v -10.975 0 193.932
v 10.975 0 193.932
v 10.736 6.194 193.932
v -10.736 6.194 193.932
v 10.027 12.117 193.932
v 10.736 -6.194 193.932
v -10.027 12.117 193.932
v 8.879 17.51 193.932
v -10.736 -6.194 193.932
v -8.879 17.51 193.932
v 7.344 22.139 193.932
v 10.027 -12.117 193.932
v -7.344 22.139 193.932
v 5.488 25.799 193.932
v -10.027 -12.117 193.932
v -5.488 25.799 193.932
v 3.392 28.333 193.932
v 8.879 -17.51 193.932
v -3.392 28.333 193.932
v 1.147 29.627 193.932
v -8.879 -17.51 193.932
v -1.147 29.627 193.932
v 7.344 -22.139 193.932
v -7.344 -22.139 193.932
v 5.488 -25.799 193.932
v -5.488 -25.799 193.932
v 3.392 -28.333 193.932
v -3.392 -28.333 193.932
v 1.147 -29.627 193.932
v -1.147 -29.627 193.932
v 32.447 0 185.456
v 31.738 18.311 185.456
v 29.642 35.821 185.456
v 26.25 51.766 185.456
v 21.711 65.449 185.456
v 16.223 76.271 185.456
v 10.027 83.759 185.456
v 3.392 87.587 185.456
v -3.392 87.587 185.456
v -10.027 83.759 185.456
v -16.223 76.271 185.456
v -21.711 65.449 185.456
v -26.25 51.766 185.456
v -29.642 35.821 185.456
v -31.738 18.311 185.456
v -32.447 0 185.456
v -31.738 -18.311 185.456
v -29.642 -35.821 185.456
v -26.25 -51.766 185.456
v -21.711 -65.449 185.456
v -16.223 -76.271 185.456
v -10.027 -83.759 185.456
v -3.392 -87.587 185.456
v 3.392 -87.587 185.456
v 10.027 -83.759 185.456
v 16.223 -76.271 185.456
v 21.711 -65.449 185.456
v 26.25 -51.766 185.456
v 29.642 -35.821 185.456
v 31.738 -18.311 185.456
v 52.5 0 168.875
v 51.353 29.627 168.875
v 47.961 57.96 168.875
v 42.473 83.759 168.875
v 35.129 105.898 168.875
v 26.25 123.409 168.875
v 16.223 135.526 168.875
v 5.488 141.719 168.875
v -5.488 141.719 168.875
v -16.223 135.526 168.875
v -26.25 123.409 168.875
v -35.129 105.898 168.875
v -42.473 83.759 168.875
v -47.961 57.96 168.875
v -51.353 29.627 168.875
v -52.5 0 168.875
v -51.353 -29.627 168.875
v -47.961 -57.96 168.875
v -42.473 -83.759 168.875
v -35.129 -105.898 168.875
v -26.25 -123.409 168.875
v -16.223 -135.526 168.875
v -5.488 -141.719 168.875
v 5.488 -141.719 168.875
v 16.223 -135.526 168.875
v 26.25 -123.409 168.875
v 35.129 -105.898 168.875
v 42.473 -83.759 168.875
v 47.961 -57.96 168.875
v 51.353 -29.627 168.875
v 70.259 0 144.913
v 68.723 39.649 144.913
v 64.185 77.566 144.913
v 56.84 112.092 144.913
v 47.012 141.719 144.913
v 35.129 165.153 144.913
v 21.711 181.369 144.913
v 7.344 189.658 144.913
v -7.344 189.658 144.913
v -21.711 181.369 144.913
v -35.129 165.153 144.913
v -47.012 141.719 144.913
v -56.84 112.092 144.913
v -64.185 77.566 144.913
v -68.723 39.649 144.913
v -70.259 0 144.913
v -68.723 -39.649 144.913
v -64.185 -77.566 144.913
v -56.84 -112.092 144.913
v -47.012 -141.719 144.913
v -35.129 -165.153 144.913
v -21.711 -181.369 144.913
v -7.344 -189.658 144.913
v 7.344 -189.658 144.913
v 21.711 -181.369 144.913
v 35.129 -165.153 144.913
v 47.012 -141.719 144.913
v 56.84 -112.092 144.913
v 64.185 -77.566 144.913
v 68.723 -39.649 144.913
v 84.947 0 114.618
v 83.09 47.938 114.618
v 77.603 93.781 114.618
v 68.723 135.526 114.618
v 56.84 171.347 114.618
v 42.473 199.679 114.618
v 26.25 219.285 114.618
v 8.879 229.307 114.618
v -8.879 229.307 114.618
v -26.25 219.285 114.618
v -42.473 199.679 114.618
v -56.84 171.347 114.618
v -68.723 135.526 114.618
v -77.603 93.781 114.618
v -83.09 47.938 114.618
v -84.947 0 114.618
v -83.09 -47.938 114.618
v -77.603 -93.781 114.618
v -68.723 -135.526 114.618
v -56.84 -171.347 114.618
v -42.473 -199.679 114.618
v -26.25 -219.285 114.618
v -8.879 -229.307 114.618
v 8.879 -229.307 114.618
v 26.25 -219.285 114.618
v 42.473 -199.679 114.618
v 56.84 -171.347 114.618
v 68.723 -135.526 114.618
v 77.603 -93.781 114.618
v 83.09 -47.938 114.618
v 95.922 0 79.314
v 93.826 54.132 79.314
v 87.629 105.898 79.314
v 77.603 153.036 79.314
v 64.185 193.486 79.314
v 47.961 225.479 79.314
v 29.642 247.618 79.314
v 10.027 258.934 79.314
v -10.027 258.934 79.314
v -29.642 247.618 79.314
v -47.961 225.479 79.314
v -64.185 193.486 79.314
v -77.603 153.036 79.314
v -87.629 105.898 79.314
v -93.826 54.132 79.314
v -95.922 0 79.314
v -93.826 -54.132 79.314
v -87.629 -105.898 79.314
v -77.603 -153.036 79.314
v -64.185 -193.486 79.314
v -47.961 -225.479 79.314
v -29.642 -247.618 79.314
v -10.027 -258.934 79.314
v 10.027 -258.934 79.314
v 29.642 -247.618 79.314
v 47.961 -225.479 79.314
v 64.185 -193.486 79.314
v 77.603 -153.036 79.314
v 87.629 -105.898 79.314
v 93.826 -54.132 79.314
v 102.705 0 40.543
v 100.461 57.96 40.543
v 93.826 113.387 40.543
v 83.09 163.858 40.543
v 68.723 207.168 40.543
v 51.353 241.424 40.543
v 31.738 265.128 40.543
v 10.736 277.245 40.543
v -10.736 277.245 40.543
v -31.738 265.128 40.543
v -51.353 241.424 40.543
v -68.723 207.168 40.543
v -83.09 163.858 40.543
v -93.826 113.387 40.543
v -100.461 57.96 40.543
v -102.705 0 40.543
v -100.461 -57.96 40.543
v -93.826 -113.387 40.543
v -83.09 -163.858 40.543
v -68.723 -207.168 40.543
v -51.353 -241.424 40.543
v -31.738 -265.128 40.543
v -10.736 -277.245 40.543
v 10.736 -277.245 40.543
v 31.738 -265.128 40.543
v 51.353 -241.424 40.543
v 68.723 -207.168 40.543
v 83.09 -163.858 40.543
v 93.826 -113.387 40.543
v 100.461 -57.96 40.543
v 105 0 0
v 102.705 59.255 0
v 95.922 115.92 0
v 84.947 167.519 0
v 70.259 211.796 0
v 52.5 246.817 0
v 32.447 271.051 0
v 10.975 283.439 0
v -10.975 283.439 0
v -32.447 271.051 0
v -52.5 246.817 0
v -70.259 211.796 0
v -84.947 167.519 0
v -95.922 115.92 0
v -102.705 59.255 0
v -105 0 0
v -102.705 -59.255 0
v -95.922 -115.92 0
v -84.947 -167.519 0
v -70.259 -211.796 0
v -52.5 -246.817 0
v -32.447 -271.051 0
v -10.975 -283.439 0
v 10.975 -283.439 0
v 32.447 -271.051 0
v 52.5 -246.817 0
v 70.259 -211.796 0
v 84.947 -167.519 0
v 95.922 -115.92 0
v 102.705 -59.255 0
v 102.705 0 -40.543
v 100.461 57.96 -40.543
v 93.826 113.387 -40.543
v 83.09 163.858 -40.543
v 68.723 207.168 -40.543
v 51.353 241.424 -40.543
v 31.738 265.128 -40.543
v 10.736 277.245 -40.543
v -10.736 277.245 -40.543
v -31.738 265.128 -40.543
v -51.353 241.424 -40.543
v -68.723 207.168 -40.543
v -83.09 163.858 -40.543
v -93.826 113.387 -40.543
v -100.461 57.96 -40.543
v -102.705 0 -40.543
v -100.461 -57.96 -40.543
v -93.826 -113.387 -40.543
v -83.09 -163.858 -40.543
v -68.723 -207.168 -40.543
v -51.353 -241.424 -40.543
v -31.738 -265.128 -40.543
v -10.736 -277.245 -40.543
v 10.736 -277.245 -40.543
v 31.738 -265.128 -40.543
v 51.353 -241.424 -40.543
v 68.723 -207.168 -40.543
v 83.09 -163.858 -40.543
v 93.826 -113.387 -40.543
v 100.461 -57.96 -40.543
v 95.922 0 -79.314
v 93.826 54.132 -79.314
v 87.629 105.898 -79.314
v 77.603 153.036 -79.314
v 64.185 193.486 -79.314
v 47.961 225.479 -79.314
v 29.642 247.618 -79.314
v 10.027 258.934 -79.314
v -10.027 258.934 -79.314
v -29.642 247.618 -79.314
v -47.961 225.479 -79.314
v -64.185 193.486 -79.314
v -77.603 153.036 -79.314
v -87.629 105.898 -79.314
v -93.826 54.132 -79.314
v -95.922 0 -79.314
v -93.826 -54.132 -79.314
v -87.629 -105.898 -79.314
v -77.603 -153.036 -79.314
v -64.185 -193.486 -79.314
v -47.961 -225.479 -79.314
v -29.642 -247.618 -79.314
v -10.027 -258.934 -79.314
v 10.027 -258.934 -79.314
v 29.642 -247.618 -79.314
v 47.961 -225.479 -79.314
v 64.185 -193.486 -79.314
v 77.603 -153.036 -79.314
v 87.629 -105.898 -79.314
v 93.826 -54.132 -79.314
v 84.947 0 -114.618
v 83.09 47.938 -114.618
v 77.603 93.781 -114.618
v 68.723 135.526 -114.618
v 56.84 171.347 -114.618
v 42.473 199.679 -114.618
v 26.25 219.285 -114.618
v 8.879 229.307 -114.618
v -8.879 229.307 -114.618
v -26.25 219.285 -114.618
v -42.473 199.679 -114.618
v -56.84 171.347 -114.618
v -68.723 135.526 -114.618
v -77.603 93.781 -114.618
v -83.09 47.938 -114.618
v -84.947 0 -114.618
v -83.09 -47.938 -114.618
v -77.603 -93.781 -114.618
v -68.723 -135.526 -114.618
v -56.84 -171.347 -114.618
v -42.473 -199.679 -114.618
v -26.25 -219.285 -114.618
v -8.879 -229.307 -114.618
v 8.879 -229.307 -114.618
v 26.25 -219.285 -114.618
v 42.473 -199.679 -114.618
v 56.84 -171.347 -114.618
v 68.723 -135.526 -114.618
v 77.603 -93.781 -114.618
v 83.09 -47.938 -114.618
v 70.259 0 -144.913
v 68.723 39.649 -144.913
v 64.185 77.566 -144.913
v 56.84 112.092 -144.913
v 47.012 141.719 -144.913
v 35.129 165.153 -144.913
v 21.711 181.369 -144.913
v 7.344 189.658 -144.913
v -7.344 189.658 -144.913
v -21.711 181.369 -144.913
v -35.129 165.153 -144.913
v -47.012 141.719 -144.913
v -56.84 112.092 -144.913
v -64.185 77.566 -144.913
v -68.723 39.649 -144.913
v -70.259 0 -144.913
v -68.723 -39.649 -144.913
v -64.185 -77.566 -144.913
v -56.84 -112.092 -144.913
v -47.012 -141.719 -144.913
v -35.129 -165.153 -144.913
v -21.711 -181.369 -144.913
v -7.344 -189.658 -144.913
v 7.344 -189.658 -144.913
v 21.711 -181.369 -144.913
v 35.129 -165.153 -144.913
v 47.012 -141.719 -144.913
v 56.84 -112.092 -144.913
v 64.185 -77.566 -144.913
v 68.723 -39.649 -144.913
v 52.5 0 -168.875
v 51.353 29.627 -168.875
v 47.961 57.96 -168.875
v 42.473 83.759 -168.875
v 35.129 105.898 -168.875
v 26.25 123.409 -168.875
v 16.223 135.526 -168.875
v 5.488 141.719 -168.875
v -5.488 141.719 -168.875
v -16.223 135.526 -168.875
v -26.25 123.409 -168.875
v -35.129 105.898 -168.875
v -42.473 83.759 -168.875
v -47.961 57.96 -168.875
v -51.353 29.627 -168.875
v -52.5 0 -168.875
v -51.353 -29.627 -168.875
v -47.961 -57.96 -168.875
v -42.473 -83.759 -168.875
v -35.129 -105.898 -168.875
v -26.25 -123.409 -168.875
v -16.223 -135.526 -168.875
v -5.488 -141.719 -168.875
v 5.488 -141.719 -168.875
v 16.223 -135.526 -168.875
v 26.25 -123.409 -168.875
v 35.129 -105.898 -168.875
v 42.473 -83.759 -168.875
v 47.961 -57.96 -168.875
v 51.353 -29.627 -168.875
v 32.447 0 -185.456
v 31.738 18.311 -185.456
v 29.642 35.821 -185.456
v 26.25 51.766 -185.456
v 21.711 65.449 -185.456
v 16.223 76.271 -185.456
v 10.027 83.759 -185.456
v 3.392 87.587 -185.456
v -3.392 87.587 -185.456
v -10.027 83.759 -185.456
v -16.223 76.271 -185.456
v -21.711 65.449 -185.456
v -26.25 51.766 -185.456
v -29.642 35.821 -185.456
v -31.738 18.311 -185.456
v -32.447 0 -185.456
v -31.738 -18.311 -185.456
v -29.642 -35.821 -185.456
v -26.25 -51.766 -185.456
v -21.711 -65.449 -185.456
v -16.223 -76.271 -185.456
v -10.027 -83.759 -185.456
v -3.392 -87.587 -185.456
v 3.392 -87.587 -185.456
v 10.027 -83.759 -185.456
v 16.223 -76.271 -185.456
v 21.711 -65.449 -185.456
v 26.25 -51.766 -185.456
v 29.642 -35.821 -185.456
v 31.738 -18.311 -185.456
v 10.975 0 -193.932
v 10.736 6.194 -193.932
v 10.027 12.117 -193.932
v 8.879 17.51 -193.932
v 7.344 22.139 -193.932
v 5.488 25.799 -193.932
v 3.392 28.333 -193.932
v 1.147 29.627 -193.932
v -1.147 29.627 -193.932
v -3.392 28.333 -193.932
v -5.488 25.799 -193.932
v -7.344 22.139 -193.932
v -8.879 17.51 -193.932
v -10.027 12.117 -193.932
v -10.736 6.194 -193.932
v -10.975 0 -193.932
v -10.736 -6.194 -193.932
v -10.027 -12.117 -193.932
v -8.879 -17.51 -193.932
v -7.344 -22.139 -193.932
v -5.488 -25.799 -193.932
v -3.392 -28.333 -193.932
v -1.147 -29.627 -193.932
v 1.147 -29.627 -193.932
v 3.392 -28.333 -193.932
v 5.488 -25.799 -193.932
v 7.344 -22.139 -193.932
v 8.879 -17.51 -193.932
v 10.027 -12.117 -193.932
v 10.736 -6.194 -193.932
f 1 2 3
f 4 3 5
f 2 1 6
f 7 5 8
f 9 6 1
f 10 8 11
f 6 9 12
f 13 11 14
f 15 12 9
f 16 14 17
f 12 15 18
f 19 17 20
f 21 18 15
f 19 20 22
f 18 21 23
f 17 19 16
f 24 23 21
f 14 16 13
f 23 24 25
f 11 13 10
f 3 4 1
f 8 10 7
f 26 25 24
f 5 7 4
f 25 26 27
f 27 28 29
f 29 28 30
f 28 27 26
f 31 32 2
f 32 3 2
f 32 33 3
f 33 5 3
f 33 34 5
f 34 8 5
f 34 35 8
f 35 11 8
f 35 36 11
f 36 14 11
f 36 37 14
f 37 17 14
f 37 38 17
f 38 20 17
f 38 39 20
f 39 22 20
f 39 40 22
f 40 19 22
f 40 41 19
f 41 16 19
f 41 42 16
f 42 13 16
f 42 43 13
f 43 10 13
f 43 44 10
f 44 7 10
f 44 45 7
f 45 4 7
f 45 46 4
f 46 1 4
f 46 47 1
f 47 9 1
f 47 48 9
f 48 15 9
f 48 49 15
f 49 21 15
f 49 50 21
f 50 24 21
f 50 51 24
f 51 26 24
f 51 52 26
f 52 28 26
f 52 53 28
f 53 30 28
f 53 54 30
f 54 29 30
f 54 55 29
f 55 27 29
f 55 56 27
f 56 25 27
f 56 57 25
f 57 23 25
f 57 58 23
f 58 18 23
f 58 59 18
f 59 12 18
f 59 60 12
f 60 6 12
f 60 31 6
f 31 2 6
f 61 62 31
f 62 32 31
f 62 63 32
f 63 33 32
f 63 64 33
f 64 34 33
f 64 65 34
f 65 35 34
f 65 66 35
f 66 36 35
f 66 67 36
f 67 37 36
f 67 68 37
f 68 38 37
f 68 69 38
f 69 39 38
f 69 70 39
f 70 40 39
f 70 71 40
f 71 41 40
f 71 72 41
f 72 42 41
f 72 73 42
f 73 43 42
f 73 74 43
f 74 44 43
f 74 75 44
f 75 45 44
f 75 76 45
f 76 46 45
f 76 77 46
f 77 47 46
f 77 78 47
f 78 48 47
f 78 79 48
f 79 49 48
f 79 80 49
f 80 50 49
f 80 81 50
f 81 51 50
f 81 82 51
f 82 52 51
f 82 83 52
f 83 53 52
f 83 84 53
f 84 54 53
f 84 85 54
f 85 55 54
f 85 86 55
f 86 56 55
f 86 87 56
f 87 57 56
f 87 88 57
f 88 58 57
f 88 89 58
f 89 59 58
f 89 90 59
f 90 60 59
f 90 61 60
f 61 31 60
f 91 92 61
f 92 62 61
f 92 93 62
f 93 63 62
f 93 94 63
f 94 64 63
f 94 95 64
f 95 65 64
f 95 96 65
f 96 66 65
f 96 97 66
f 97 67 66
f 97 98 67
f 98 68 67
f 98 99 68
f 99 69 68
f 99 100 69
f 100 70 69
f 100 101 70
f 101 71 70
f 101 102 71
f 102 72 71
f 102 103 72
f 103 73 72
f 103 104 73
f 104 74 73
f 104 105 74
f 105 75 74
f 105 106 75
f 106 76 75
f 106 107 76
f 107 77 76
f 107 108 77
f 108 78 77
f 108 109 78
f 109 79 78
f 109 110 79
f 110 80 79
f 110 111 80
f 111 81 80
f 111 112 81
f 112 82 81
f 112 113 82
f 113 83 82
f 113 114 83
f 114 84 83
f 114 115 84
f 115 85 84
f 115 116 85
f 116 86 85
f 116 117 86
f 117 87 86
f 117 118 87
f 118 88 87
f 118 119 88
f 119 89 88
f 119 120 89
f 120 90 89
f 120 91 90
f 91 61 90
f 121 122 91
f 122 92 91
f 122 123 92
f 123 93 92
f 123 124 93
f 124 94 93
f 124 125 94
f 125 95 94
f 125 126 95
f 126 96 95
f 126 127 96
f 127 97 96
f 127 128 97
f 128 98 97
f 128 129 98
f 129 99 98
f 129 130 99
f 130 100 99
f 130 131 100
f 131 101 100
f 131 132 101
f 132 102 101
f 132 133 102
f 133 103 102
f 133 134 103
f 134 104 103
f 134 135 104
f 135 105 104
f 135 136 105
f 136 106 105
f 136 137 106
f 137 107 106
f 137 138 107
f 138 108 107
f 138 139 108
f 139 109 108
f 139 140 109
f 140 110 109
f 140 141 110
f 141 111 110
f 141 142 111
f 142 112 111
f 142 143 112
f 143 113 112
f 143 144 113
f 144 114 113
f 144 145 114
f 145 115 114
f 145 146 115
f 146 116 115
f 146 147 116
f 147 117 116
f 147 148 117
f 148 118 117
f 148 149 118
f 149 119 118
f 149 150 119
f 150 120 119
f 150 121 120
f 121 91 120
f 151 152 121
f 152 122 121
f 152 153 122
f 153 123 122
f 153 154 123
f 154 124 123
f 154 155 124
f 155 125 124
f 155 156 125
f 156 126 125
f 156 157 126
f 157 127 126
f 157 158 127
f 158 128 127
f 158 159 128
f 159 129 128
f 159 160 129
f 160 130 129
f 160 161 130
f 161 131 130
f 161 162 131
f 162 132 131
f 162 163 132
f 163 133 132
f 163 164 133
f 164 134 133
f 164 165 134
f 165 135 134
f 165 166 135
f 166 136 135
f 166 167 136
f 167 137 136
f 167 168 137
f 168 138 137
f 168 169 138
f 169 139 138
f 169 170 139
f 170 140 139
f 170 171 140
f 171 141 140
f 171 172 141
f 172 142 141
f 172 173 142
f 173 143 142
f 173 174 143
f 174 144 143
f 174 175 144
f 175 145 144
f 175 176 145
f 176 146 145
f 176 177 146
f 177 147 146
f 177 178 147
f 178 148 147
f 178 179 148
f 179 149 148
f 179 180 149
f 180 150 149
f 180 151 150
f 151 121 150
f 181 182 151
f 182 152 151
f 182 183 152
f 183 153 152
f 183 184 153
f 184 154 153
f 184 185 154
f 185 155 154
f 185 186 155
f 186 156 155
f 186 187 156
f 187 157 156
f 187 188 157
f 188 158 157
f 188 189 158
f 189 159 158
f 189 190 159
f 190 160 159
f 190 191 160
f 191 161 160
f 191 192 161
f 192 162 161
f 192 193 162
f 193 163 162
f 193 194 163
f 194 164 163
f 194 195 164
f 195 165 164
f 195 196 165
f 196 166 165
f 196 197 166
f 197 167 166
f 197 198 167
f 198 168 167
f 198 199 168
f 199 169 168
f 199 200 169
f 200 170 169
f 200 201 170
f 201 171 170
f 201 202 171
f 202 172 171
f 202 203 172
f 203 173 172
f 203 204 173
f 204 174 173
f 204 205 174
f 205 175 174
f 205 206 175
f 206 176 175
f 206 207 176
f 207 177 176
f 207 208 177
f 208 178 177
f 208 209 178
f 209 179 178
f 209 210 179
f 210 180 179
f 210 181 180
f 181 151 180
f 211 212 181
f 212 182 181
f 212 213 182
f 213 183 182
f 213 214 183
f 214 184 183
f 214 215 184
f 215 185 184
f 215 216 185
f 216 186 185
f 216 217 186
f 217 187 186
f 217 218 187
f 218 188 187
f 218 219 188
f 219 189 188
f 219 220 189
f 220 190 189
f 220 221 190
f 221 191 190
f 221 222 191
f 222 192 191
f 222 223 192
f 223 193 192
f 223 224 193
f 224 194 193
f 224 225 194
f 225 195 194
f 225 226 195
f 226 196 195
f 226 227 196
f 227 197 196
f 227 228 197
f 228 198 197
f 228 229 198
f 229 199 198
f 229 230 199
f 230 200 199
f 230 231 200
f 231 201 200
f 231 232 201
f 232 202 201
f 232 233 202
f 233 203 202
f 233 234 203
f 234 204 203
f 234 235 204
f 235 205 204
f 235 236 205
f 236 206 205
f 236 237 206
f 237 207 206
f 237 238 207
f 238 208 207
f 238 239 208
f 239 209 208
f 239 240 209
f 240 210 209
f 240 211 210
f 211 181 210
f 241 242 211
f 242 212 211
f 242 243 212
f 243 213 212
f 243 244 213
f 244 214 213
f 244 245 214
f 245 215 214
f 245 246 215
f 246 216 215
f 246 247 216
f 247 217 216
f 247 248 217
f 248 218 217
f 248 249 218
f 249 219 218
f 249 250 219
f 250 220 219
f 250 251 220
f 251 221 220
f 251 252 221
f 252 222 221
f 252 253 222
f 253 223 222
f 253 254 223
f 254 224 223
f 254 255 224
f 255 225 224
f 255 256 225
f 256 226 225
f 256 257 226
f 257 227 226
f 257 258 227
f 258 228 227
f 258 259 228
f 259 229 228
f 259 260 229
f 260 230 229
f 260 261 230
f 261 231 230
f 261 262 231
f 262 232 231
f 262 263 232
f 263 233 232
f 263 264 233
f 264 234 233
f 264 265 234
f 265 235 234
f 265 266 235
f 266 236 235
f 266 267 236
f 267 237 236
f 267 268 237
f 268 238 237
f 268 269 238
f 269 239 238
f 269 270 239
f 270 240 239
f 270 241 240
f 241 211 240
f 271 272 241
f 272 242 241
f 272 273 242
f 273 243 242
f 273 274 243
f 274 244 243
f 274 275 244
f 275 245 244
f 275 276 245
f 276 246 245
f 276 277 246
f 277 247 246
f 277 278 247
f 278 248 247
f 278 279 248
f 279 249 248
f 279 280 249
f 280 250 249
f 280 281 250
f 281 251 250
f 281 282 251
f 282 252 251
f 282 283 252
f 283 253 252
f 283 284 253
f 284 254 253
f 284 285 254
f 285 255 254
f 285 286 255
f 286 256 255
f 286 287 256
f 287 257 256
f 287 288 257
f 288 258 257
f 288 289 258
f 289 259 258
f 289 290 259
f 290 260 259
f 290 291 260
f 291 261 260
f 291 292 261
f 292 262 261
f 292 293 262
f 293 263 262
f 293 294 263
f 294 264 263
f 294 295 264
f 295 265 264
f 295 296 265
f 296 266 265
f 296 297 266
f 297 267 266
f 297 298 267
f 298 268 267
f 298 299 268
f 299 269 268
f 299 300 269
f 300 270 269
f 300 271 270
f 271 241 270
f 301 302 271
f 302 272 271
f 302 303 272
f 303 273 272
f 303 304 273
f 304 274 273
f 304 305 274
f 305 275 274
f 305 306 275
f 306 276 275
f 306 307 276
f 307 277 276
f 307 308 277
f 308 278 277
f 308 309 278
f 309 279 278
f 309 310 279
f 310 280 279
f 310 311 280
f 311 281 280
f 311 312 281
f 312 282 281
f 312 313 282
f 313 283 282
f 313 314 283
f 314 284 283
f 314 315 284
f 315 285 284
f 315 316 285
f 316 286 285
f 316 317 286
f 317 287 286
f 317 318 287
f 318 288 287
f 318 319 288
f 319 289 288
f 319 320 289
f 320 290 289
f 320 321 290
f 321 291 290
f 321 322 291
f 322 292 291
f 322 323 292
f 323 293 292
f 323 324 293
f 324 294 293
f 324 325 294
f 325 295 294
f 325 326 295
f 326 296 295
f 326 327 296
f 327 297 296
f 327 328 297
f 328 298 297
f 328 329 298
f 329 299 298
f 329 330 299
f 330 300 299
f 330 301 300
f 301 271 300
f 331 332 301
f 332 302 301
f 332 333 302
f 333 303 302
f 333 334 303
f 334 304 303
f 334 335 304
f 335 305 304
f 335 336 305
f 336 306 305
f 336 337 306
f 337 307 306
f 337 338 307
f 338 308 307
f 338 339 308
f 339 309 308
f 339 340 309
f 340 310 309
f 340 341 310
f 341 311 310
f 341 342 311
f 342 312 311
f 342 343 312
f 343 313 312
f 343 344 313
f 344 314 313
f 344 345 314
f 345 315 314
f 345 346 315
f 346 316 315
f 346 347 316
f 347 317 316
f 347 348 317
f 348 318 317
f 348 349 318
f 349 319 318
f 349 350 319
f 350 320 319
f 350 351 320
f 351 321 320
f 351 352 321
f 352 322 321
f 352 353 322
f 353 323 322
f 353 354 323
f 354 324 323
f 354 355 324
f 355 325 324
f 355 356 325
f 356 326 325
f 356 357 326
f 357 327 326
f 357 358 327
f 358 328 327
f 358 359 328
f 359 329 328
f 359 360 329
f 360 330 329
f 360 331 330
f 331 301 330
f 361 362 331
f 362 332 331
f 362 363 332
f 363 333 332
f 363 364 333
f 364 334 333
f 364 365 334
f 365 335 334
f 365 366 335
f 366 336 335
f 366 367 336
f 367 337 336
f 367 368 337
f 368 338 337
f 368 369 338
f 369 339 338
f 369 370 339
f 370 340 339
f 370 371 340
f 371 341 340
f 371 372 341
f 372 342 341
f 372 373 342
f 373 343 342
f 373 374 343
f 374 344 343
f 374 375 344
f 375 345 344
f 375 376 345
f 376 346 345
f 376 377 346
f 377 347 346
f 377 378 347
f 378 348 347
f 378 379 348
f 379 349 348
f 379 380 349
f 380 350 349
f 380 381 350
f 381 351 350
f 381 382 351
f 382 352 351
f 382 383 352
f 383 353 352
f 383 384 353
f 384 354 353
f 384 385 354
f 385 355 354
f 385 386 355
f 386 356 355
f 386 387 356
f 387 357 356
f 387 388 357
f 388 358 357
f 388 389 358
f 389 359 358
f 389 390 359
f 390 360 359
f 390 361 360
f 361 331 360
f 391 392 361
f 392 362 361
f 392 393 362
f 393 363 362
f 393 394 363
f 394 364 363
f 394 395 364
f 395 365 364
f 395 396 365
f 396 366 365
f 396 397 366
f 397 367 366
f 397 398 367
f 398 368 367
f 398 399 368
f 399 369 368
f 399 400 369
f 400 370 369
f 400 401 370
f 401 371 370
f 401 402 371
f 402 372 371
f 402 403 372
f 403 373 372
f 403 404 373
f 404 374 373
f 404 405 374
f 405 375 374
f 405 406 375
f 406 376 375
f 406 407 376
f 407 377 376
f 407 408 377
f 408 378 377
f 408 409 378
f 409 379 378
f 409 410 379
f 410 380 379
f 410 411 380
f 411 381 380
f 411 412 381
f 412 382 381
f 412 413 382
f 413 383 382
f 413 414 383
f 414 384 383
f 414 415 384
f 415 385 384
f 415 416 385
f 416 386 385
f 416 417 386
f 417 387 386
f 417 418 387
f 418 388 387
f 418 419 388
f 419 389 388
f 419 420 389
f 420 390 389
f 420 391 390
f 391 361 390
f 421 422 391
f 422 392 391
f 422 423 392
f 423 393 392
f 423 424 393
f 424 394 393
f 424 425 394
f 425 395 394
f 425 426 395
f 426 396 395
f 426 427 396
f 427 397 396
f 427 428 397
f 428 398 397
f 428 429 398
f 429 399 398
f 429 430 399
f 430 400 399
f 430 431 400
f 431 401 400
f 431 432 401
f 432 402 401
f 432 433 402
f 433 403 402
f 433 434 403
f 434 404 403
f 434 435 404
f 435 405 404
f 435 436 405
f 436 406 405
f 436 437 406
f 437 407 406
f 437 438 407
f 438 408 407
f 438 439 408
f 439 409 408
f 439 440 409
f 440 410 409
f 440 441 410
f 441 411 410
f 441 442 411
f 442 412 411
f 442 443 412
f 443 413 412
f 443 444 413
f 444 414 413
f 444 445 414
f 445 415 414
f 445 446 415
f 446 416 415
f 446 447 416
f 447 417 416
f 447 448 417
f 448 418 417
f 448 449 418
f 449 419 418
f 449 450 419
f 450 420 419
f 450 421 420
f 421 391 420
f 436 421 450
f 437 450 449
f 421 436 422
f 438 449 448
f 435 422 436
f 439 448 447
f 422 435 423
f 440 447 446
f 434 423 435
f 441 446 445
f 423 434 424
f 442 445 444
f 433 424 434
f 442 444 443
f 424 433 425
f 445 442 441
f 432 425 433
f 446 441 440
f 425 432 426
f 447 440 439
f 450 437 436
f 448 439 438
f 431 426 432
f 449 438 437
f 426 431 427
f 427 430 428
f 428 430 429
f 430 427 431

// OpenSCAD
// Generated by SolidPython 1.0.1 on 2020-07-29 00:46:48


scale(v = [7, 19, 13]) {
	sphere(r = 15);
}
/***********************************************
*********      SolidPython code:      **********
************************************************
 
# import packages: SolidPython
from solid import *
from solid.utils import *
from itertools import chain, combinations, permutations


class Resize:

    def __init__(self, scad_file):
        self.scad_file = scad_file
        #self.scad_file = import_scad(scad_file)
        # cone/cylinder param:
        self.r1 = 0
        self.r2 = 0
        self.h = 0
        # rectangular prism param:
        self.w = 0
        self.l = 0
        # ellipse param:
        self.r = 0

    # import OpenScad code (file name corresponds to shape)


    # classify shape + parameters
    def assign(self, param1, param2, param3):
        if self.scad_file == 'cone.scad':
            self.r1 = param1
            self.r2 = param2
            self.h = param3
        elif self.scad_file == 'cylinder.scad':
            self.r1 = param1
            self.r2 = param2
            self.h = param3
        elif self.scad_file == 'rectangularPrism.scad':
            self.h = param1
            self.l = param2
            self.w = param3
        else:
            self.r = param1
            self.h = param2

    # resize parameters
    def iterate(self):
        x = range(3, 20, 2)
        i = 1
        if self.scad_file == 'cone.scad':
            tempList = list(permutations(x, 2))
            for temp in tempList:
                param1 = temp[0]
                param2 = temp[1]
                filepath = 'produced_scad_files/' + 'cone' + str(param1) + '_' + str(param2) + '_' + '.scad'
                scad_render_to_file(cylinder(h=param1, r1=param2, r2=0), filepath)

        elif self.scad_file == 'cylinder.scad':
            tempList = list(permutations(x, 3))
            for temp in tempList:
                param1 = temp[0]
                param2 = temp[1]
                filepath = 'produced_scad_files/' + 'cylinder' + str(param1) + '_' + str(param2) + '_' + '.scad'
                scad_render_to_file(cylinder(h=param1, r1=param2, r2=param2), filepath)

        elif self.scad_file == 'rectangularPrism.scad':
            tempList = list(permutations(x, 3))
            for temp in tempList:
                param1 = temp[0]
                param2 = temp[1]
                param3 = temp[2]
                filepath = 'produced_scad_files/' + 'rectangularPrism' + str(param1) + '_' + str(param2) + '_' + str(
                    param3) + '.scad'
                scad_render_to_file(cube(size=(param1, param2, param3)), filepath)

        elif self.scad_file == 'ellipse.scad':
            tempList = list(permutations(x, 4))
            for temp in tempList:
                param1 = temp[0]
                param2 = temp[1]
                param3 = temp[2]
                param4 = temp[3]
                filepath = 'produced_scad_files/' + 'ellipse' + str(param1) + '_' + str(param2) + '_' + str(param3) + '_' + str(param4) + '.scad'
                scad_render_to_file(scale([param1, param2, param3])(sphere(r=param4)), filepath)

    def render_to_scadfile(self):
        scad_render_to_file(scad, 'example.scad') 
 
************************************************/
